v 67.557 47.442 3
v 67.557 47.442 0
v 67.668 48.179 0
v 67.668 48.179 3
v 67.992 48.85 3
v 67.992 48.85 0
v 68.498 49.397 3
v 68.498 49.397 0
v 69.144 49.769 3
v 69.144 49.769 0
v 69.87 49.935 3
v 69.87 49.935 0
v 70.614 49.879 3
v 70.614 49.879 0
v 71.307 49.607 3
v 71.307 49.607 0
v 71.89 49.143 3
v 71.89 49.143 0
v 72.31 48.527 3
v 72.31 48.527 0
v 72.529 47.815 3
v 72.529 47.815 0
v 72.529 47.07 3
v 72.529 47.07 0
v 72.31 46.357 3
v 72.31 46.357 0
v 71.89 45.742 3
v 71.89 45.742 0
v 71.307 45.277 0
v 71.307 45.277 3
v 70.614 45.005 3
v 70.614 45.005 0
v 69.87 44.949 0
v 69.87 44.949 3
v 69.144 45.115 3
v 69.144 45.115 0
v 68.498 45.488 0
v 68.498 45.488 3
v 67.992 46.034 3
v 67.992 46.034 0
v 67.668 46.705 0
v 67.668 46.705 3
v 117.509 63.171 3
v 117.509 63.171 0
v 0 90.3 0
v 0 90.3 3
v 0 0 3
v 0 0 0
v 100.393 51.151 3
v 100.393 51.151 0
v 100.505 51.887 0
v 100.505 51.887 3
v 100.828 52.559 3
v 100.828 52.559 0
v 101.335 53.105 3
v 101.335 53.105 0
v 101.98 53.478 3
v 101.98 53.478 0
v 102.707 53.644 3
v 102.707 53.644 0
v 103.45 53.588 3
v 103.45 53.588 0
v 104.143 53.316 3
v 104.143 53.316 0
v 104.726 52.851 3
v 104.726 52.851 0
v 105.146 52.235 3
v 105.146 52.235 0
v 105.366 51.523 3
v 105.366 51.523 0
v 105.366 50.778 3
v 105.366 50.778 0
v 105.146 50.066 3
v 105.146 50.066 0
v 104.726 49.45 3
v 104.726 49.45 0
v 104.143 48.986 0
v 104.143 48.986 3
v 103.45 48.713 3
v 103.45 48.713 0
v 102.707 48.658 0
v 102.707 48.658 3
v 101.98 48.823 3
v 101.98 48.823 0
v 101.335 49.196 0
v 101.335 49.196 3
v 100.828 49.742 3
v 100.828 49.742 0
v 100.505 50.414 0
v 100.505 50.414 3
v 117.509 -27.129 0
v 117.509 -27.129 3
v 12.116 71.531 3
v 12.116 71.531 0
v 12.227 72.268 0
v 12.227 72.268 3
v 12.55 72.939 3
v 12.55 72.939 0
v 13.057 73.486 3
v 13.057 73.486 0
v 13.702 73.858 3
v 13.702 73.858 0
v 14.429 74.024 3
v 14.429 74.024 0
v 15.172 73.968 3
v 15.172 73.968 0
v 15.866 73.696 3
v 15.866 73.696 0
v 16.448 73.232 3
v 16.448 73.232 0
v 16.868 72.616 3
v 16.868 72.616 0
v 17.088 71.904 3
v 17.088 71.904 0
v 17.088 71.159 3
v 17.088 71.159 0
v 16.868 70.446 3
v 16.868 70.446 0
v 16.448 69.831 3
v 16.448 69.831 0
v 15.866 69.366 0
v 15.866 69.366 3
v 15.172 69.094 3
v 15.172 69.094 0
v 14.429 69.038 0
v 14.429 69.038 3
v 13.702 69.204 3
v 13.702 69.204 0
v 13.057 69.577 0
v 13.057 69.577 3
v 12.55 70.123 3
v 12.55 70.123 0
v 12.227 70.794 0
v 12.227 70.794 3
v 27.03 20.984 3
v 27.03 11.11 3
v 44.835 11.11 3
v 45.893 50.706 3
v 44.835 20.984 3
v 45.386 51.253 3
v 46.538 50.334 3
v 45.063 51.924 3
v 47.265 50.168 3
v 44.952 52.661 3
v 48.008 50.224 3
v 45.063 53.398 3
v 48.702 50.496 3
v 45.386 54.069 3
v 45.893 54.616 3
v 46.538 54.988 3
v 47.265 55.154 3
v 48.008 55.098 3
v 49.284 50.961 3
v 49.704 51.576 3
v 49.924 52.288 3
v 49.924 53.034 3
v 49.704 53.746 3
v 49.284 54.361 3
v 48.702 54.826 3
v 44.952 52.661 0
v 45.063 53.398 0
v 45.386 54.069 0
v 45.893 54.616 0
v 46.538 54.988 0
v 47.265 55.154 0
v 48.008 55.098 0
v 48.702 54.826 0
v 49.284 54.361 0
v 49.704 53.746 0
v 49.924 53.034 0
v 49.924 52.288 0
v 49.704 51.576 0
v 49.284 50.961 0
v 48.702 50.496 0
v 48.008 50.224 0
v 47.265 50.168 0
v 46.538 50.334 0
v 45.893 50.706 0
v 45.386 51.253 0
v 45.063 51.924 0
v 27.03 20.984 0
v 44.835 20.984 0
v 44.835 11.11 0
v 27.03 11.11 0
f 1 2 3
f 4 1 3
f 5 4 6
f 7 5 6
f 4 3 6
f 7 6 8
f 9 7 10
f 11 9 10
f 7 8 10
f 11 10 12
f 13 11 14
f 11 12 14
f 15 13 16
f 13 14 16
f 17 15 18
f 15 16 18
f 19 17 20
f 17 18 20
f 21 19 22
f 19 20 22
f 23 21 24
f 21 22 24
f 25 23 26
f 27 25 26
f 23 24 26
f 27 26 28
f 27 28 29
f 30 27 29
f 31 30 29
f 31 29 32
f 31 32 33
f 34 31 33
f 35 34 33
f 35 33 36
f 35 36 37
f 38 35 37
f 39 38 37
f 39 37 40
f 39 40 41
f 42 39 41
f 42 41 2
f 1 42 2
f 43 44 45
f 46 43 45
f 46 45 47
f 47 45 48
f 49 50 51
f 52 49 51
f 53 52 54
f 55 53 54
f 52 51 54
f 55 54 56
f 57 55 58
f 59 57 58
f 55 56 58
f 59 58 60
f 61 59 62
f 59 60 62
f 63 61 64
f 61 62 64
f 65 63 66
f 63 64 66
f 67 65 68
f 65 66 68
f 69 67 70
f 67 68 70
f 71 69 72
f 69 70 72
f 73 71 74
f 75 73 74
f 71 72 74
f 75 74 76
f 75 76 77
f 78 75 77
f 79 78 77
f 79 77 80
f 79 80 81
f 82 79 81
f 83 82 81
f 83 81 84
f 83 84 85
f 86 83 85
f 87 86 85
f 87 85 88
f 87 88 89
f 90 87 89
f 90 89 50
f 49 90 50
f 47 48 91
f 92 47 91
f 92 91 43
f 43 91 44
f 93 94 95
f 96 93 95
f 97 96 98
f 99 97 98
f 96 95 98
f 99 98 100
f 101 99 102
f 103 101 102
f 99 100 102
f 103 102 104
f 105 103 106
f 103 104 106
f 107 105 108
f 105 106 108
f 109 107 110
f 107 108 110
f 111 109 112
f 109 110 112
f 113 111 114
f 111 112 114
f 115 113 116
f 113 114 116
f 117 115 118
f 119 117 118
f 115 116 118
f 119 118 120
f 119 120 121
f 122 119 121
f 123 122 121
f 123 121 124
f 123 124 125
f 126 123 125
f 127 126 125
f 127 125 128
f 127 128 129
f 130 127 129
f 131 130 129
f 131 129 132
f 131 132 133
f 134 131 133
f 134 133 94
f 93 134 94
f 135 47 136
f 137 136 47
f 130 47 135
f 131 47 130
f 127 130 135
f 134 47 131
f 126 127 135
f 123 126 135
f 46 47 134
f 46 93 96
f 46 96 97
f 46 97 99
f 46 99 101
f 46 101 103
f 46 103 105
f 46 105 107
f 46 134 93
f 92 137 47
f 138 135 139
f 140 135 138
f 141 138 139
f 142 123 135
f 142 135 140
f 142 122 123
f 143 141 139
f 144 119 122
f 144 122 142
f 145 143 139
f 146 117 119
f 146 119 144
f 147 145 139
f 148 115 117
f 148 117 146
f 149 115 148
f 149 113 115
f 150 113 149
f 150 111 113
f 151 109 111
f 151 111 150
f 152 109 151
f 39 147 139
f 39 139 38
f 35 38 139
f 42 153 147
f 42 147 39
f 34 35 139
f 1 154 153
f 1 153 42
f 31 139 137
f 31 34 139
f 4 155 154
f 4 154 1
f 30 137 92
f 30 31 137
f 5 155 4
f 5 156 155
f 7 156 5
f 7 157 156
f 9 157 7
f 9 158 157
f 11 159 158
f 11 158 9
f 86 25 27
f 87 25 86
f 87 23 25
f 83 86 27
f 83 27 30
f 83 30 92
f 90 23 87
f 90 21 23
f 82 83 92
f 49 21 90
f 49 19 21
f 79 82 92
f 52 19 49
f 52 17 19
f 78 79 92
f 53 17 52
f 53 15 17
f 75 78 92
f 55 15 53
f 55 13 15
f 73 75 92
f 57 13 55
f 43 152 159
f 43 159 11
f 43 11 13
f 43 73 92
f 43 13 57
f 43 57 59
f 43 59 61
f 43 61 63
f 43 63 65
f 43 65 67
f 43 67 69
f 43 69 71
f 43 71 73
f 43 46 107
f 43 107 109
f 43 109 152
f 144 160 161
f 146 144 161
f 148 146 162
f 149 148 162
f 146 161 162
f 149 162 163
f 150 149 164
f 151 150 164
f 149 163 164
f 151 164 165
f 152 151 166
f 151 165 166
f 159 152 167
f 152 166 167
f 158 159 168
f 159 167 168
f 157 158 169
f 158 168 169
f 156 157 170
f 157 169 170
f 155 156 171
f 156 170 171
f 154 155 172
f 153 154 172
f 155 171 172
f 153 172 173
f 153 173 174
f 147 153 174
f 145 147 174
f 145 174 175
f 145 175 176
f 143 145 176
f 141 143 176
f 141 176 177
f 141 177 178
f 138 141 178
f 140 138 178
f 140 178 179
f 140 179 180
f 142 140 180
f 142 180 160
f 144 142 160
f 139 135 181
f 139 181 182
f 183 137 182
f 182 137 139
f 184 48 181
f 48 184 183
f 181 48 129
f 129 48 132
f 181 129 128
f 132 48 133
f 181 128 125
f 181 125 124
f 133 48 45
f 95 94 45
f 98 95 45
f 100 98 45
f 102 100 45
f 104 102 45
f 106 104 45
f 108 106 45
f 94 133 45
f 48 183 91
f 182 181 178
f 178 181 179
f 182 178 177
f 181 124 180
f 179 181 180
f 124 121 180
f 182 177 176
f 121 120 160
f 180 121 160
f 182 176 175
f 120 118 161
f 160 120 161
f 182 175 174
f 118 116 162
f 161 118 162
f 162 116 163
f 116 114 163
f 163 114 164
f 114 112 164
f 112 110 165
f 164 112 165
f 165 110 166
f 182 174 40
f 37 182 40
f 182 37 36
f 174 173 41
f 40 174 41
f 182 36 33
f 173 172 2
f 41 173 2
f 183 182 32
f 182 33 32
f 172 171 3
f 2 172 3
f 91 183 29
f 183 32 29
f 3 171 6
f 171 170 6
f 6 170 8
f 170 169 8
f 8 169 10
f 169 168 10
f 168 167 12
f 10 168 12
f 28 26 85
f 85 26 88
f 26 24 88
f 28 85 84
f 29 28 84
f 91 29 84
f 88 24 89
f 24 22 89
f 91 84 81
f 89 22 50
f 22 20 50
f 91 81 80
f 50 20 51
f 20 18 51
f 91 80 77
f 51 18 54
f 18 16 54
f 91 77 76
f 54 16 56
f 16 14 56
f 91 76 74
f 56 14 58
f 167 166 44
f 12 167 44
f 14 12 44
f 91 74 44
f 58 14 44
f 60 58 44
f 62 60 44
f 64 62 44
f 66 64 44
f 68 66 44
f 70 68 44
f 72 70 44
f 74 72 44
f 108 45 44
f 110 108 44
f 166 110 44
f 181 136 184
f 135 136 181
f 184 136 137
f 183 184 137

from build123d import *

# Parameters (mm, degrees)
RESSALTO_EXTRUS_O1_DEPTH                = 3
BROCA_DE_ROSQUEAR_PARA_TARRAXA_DE_M61_D = 5
ESBO_O4_W                               = 17.804449836
ESBO_O4_H                               = 9.873376728
CORTE_EXTRUS_O1_DEPTH                   = 149.227737241


with BuildPart() as part:
    # Esboço1 → Ressalto-extrusão1 (new body)
    with BuildSketch(Plane.XY):
        Polygon((0, 0), (117.509029813, -27.129097154), (117.509029813, 63.170902846), (0, 90.3), align=None)
    extrude(amount=RESSALTO_EXTRUS_O1_DEPTH)

    # Broca de rosquear para tarraxa de M61 (through all)
    with Locations(Plane.XY.offset(3)):
        with Locations((14.615550972, 71.531172568), (102.893478841, 51.150607044), (70.057207658, 47.44211239), (47.451822155, 52.660976851)):
            Hole(BROCA_DE_ROSQUEAR_PARA_TARRAXA_DE_M61_D / 2)

    # Esboço4 → Corte-extrusão1 (cut, through all)
    with BuildSketch(Plane.XY.offset(3)):
        with Locations((35.932447389, 16.047022475)):
            Rectangle(ESBO_O4_W, ESBO_O4_H)
    extrude(amount=-CORTE_EXTRUS_O1_DEPTH, mode=Mode.SUBTRACT)


solid = part.part
